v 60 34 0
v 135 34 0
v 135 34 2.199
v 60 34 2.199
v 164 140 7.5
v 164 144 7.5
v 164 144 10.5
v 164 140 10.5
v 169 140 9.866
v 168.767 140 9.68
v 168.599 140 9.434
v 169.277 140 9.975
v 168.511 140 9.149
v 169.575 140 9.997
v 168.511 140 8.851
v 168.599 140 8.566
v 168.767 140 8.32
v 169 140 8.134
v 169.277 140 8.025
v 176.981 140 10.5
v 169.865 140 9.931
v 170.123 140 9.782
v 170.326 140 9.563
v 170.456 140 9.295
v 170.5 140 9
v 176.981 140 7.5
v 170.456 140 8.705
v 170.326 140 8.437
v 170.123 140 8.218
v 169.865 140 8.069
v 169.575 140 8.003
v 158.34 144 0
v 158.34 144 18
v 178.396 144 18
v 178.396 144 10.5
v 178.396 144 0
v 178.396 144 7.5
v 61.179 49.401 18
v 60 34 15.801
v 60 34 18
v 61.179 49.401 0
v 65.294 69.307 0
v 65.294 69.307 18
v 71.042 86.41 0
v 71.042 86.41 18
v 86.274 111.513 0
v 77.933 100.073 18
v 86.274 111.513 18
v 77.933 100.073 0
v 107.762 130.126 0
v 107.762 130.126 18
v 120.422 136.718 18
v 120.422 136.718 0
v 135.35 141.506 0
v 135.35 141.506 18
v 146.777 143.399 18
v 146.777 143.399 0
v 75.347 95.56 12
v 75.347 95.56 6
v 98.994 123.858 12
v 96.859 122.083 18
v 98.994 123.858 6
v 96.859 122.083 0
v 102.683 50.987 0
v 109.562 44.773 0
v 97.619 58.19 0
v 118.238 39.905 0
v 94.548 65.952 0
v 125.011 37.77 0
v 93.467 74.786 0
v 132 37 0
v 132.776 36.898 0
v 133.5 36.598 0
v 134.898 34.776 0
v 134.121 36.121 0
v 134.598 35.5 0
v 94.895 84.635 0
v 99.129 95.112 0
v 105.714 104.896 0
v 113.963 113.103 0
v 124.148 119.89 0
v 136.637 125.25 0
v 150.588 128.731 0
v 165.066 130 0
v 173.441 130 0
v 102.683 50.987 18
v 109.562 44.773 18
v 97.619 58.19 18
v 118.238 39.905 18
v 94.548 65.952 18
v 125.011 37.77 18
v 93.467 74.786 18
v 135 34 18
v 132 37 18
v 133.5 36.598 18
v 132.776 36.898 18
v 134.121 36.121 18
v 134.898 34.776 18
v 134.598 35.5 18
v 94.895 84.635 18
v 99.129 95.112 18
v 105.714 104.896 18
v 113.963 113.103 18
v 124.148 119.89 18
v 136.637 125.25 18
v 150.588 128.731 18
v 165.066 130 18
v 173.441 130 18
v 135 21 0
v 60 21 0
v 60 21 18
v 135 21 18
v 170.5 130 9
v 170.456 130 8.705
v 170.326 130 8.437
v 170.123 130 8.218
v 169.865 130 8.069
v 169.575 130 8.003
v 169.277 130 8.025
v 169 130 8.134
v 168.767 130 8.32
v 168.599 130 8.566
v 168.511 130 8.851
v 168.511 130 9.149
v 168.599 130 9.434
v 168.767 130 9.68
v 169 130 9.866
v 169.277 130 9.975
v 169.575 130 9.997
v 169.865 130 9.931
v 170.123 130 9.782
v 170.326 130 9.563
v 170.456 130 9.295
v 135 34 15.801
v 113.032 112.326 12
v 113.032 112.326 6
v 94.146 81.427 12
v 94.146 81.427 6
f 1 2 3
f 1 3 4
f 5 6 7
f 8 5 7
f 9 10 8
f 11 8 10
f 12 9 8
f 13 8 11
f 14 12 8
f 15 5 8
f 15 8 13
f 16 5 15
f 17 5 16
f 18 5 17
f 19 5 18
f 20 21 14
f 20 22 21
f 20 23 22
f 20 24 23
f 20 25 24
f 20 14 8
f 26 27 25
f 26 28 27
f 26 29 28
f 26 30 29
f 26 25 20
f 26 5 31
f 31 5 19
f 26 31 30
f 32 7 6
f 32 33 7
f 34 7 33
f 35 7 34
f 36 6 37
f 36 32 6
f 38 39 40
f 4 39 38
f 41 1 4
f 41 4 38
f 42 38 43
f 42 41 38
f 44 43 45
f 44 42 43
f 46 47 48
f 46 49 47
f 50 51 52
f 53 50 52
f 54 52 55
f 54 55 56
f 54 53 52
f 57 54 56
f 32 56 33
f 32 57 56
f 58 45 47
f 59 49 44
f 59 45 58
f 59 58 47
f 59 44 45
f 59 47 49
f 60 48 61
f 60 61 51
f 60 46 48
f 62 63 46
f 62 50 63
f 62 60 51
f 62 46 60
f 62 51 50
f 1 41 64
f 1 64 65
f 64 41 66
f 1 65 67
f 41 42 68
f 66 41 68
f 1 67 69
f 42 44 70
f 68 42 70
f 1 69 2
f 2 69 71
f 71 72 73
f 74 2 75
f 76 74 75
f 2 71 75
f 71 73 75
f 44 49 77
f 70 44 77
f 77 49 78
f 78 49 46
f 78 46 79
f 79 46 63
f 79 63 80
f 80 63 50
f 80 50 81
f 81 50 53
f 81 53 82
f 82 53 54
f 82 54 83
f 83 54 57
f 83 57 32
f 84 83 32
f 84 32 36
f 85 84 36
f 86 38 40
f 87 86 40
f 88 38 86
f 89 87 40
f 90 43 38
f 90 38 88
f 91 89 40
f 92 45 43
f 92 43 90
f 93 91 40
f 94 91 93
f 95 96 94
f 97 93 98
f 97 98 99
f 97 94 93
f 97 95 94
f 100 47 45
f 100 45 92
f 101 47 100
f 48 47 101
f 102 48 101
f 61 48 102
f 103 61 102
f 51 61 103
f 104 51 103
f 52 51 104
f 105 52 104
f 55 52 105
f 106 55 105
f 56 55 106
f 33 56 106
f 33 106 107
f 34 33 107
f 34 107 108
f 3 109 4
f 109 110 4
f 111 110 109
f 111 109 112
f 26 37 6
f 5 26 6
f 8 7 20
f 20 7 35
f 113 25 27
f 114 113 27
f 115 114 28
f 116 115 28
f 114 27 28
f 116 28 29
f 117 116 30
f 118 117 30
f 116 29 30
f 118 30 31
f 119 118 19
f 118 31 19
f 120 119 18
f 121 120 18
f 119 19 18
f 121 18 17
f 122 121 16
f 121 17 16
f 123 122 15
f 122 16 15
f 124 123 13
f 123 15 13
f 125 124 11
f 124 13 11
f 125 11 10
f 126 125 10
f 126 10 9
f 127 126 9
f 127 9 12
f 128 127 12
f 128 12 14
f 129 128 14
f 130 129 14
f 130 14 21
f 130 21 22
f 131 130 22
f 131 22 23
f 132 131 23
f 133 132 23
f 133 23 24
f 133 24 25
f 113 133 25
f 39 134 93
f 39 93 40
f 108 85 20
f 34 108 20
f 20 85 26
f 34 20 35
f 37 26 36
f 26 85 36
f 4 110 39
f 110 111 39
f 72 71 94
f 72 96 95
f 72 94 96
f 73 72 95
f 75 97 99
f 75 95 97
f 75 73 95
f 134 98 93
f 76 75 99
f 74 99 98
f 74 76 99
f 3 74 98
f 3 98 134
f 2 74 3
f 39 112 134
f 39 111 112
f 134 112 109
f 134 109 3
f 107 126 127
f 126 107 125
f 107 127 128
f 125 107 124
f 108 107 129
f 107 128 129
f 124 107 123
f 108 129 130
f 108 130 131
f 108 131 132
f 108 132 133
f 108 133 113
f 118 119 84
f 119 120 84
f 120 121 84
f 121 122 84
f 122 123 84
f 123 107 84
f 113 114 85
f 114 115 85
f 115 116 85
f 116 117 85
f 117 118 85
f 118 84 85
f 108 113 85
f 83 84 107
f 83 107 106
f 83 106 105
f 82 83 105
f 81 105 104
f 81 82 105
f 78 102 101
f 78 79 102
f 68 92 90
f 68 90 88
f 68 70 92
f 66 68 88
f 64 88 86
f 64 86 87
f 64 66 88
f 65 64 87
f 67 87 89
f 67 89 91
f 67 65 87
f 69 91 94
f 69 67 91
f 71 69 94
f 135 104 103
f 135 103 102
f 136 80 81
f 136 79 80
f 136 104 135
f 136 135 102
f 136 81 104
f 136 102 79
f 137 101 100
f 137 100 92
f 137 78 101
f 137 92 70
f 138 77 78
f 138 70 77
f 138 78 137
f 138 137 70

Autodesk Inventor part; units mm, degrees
ref_plane "XZ Plane" through (0, 0, 0) normal (0, 1, 0) x (-1, 0, 0)
ref_plane "XY Plane" through (0, 0, 0) normal (0, 0, 1) x (1, 0, 0)
sketch "Sketch1" plane through (0, 0, 0) normal (0, 0, 1) x (1, 0, 0)
  line L0 (60, 34) -> (279, 34) construction
  line L1 (279, 34) -> (279, 16) construction
  line L2 (279, 16) -> (60, 16) construction
  line L3 (60, 16) -> (60, 34) construction
  line L4 (158.3401, 144) -> (180.6599, 144)
  line L5 (-98.1271, 119.3914) -> (-155.2055, 119.3914) construction
  line L6 (60, 204.7828) -> (279, 204.7828) construction
  line L7 (279, 204.7828) -> (279, 222.7828) construction
  line L8 (279, 222.7828) -> (60, 222.7828) construction
  line L9 (60, 222.7828) -> (60, 204.7828) construction
  line L10 (158.3401, 94.7828) -> (180.6599, 94.7828) construction
  line L11 (169.5, 144) -> (169.5, 94.7828) construction
  circle A0 centre (169.5, 144.5) radius 4.5 construction
  circle A1 centre (169.5, 94.2828) radius 4.5 construction
  line L12 (165, 140) -> (174, 140) construction
  spline S0 degree 4 poles (60, 34) (60, 50.8003) (67.6192, 82.543) (79.1211, 110.1157) (114.0169, 138.9549) (142.0747, 144) (158.3401, 144) knots 0 0 0 0 0 0.37584 0.62584 1 1 1 1 1
  line L13 (436.9307, -63.7999) -> (436.9307, -111.3151) construction
  line L14 (165.0658, 130) -> (173.4412, 130)
  line L15 (173.4412, 130) -> (178.3964, 144)
  line L16 (178.3964, 144) -> (180.6599, 144)
  line L17 (166.2744, 149) -> (172.7256, 149) construction
  spline S1 degree 4 poles (165.0658, 130) (150.6222, 130) (124.5762, 123.7444) (97.0964, 105.142) (83.3994, 60.1633) (114.2343, 37) (132, 37) knots 0 0 0 0 0 0.366098 0.616098 1 1 1 1 1
  line L18 (158.3401, 94.7828) -> (180.6599, 94.7828) construction
  line L19 (178.3964, 94.7828) -> (180.6599, 94.7828) construction
  line L20 (180.6599, 94.7828) -> (158.3401, 94.7828) construction
  spline S2 degree 4 poles (173.9342, 106.4847) (188.3699, 106.4847) (225.2165, 124.0597) (250.4536, 142.2568) (239.0722, 211.617) (207.7908, 202.4847) knots 0 0 0 0 0 0.376784 1 1 1 1 1 construction
  spline S3 degree 4 poles (279, 204.7828) (275.6992, 148.3745) (255.9313, 132.0927) (229.7092, 97.2581) (180.6599, 94.7828) knots 0 0 0 0 0 1 1 1 1 1 construction
  line L21 (173.9342, 106.4847) -> (158.8804, 106.4847) construction
  line L22 (160.6036, 94.7828) -> (158.3401, 94.7828) construction
  line L23 (158.8804, 106.4847) -> (160.6036, 94.7828) construction
  arc A2 (135, 34) -> (132, 37) centre (132, 34) ccw
  line L24 (135, 34) -> (60, 34)
  point P0 (0, 0)
  point P1 (169.5, 34)
  point P2 (169.5, 204.7828)
  point P3 (93.4315, 204.7828)
  point P4 (169.5, 140)
  point P5 (69.0653, 81.3021)
  point P6 (84.771, 109.712)
  point P7 (114.2865, 133.8506)
  point P8 (169.5, 149)
  point P9 (126.5497, 121.1282)
  point P10 (101.7633, 99.5435)
  point P11 (94.9383, 64.5723)
  point P12 (209.9254, 118.4197)
  point P13 (233.3153, 142.9189)
  point P14 (236.6483, 184.5924)
  point P15 (268.3461, 156.1626)
  point P16 (250.8428, 129.4297)
  point P17 (224.4145, 107.9607)
  dimension "d0" = 18
  dimension "d2" = 219
  dimension "d4" = 16
  dimension "d5" = 60
  dimension "d6" = 110
  dimension "d9" = 9
  dimension "d11" = 10
  dimension "exposed" = 5
  dimension "d13" = 14
  dimension "d23" = 3
  dimension "d43" = 75
  dimension "d48" = 109.5
extrude "Extrusion1" add sketch "Sketch1" along normal blind 18
sketch "Sketch4" plane through (158.3401, 144, 0) normal (0, 1, 0) x (1, 0, 0)
  line L0 (-98.3401, -118.5) -> (120.6599, -118.5) construction
  line L1 (120.6599, -118.5) -> (120.6599, 100.5) construction
  line L2 (120.6599, 100.5) -> (-98.3401, 100.5) construction
  circle A0 centre (11.1599, -9) radius 1
  line L3 (-98.3401, 0) -> (-98.3401, -18) projected
  line L4 (20.0563, 0) -> (20.0563, -18) projected
  point P0 (-158.3401, 0)
  point P1 (11.1599, -118.5)
  point P2 (120.6599, -9)
  point P3 (20.0563, -9)
  dimension "d30" = 219
  dimension "d31" = 219
  dimension "d32" = 2
  dimension "d49" = 109.5
extrude "Extrusion5" cut sketch "Sketch4" against normal through all
sketch "Sketch5" plane through (158.3401, 144, 0) normal (0, 1, 0) x (1, 0, 0)
  line L0 (26.7348, -7.5) -> (5.6599, -7.5)
  line L1 (5.6599, -7.5) -> (5.6599, -10.5)
  line L2 (5.6599, -10.5) -> (26.7348, -10.5)
  line L3 (26.7348, -10.5) -> (26.7348, -7.5)
  circle A0 centre (11.1599, -9) radius 1 projected
  line L4 (6.6599, -8.6) -> (15.6599, -8.6) construction
  line L5 (15.6599, -8.6) -> (15.6599, -9.4) construction
  line L6 (15.6599, -9.4) -> (6.6599, -9.4) construction
  line L7 (6.6599, -9.4) -> (6.6599, -8.6) construction
  point P0 (-158.3401, 0)
  point P1 (5.6599, -9)
  point P2 (6.6599, -9)
  point P3 (11.1599, -8.6)
  point P4 (11.1599, -10.5)
  point P5 (11.1599, -7.5)
  dimension "d35" = 3
  dimension "d36" = 9
  dimension "d37" = 0.8
  dimension "d41" = 1
extrude "Extrusion6" cut sketch "Sketch5" against normal blind 4 contours L3 L2 L1 L0 | A0
ref_plane "Work Plane3" through (60, 34, 18) normal (1, 0, 0) x (0, 1, 0)
sketch "Sketch6" plane through (60, 34, 18) normal (1, 0, 0) x (0, 1, 0)
  line L0 (-13, -18) -> (-13, 0)
  line L1 (0, -18) -> (0, 0) projected
  line L2 (-13, -18) -> (0, -15.8012)
  line L3 (0, -18) -> (0, 0) projected
  line L4 (0, -15.8012) -> (-9.0304, -15.8012) construction
  line L5 (-15.1424, -9) -> (-18.4796, -9) construction
  line L6 (-13, 0) -> (0, -2.1988)
  point P0 (-34, -18)
  point P1 (-16.811, -9)
  point P2 (-13, -9)
  dimension "d44" = 13
  dimension "d45" = 9.6
extrude "Extrusion7" add sketch "Sketch6" along normal up to surface (75 mm away)
properties part number "TNS-1-arm"
